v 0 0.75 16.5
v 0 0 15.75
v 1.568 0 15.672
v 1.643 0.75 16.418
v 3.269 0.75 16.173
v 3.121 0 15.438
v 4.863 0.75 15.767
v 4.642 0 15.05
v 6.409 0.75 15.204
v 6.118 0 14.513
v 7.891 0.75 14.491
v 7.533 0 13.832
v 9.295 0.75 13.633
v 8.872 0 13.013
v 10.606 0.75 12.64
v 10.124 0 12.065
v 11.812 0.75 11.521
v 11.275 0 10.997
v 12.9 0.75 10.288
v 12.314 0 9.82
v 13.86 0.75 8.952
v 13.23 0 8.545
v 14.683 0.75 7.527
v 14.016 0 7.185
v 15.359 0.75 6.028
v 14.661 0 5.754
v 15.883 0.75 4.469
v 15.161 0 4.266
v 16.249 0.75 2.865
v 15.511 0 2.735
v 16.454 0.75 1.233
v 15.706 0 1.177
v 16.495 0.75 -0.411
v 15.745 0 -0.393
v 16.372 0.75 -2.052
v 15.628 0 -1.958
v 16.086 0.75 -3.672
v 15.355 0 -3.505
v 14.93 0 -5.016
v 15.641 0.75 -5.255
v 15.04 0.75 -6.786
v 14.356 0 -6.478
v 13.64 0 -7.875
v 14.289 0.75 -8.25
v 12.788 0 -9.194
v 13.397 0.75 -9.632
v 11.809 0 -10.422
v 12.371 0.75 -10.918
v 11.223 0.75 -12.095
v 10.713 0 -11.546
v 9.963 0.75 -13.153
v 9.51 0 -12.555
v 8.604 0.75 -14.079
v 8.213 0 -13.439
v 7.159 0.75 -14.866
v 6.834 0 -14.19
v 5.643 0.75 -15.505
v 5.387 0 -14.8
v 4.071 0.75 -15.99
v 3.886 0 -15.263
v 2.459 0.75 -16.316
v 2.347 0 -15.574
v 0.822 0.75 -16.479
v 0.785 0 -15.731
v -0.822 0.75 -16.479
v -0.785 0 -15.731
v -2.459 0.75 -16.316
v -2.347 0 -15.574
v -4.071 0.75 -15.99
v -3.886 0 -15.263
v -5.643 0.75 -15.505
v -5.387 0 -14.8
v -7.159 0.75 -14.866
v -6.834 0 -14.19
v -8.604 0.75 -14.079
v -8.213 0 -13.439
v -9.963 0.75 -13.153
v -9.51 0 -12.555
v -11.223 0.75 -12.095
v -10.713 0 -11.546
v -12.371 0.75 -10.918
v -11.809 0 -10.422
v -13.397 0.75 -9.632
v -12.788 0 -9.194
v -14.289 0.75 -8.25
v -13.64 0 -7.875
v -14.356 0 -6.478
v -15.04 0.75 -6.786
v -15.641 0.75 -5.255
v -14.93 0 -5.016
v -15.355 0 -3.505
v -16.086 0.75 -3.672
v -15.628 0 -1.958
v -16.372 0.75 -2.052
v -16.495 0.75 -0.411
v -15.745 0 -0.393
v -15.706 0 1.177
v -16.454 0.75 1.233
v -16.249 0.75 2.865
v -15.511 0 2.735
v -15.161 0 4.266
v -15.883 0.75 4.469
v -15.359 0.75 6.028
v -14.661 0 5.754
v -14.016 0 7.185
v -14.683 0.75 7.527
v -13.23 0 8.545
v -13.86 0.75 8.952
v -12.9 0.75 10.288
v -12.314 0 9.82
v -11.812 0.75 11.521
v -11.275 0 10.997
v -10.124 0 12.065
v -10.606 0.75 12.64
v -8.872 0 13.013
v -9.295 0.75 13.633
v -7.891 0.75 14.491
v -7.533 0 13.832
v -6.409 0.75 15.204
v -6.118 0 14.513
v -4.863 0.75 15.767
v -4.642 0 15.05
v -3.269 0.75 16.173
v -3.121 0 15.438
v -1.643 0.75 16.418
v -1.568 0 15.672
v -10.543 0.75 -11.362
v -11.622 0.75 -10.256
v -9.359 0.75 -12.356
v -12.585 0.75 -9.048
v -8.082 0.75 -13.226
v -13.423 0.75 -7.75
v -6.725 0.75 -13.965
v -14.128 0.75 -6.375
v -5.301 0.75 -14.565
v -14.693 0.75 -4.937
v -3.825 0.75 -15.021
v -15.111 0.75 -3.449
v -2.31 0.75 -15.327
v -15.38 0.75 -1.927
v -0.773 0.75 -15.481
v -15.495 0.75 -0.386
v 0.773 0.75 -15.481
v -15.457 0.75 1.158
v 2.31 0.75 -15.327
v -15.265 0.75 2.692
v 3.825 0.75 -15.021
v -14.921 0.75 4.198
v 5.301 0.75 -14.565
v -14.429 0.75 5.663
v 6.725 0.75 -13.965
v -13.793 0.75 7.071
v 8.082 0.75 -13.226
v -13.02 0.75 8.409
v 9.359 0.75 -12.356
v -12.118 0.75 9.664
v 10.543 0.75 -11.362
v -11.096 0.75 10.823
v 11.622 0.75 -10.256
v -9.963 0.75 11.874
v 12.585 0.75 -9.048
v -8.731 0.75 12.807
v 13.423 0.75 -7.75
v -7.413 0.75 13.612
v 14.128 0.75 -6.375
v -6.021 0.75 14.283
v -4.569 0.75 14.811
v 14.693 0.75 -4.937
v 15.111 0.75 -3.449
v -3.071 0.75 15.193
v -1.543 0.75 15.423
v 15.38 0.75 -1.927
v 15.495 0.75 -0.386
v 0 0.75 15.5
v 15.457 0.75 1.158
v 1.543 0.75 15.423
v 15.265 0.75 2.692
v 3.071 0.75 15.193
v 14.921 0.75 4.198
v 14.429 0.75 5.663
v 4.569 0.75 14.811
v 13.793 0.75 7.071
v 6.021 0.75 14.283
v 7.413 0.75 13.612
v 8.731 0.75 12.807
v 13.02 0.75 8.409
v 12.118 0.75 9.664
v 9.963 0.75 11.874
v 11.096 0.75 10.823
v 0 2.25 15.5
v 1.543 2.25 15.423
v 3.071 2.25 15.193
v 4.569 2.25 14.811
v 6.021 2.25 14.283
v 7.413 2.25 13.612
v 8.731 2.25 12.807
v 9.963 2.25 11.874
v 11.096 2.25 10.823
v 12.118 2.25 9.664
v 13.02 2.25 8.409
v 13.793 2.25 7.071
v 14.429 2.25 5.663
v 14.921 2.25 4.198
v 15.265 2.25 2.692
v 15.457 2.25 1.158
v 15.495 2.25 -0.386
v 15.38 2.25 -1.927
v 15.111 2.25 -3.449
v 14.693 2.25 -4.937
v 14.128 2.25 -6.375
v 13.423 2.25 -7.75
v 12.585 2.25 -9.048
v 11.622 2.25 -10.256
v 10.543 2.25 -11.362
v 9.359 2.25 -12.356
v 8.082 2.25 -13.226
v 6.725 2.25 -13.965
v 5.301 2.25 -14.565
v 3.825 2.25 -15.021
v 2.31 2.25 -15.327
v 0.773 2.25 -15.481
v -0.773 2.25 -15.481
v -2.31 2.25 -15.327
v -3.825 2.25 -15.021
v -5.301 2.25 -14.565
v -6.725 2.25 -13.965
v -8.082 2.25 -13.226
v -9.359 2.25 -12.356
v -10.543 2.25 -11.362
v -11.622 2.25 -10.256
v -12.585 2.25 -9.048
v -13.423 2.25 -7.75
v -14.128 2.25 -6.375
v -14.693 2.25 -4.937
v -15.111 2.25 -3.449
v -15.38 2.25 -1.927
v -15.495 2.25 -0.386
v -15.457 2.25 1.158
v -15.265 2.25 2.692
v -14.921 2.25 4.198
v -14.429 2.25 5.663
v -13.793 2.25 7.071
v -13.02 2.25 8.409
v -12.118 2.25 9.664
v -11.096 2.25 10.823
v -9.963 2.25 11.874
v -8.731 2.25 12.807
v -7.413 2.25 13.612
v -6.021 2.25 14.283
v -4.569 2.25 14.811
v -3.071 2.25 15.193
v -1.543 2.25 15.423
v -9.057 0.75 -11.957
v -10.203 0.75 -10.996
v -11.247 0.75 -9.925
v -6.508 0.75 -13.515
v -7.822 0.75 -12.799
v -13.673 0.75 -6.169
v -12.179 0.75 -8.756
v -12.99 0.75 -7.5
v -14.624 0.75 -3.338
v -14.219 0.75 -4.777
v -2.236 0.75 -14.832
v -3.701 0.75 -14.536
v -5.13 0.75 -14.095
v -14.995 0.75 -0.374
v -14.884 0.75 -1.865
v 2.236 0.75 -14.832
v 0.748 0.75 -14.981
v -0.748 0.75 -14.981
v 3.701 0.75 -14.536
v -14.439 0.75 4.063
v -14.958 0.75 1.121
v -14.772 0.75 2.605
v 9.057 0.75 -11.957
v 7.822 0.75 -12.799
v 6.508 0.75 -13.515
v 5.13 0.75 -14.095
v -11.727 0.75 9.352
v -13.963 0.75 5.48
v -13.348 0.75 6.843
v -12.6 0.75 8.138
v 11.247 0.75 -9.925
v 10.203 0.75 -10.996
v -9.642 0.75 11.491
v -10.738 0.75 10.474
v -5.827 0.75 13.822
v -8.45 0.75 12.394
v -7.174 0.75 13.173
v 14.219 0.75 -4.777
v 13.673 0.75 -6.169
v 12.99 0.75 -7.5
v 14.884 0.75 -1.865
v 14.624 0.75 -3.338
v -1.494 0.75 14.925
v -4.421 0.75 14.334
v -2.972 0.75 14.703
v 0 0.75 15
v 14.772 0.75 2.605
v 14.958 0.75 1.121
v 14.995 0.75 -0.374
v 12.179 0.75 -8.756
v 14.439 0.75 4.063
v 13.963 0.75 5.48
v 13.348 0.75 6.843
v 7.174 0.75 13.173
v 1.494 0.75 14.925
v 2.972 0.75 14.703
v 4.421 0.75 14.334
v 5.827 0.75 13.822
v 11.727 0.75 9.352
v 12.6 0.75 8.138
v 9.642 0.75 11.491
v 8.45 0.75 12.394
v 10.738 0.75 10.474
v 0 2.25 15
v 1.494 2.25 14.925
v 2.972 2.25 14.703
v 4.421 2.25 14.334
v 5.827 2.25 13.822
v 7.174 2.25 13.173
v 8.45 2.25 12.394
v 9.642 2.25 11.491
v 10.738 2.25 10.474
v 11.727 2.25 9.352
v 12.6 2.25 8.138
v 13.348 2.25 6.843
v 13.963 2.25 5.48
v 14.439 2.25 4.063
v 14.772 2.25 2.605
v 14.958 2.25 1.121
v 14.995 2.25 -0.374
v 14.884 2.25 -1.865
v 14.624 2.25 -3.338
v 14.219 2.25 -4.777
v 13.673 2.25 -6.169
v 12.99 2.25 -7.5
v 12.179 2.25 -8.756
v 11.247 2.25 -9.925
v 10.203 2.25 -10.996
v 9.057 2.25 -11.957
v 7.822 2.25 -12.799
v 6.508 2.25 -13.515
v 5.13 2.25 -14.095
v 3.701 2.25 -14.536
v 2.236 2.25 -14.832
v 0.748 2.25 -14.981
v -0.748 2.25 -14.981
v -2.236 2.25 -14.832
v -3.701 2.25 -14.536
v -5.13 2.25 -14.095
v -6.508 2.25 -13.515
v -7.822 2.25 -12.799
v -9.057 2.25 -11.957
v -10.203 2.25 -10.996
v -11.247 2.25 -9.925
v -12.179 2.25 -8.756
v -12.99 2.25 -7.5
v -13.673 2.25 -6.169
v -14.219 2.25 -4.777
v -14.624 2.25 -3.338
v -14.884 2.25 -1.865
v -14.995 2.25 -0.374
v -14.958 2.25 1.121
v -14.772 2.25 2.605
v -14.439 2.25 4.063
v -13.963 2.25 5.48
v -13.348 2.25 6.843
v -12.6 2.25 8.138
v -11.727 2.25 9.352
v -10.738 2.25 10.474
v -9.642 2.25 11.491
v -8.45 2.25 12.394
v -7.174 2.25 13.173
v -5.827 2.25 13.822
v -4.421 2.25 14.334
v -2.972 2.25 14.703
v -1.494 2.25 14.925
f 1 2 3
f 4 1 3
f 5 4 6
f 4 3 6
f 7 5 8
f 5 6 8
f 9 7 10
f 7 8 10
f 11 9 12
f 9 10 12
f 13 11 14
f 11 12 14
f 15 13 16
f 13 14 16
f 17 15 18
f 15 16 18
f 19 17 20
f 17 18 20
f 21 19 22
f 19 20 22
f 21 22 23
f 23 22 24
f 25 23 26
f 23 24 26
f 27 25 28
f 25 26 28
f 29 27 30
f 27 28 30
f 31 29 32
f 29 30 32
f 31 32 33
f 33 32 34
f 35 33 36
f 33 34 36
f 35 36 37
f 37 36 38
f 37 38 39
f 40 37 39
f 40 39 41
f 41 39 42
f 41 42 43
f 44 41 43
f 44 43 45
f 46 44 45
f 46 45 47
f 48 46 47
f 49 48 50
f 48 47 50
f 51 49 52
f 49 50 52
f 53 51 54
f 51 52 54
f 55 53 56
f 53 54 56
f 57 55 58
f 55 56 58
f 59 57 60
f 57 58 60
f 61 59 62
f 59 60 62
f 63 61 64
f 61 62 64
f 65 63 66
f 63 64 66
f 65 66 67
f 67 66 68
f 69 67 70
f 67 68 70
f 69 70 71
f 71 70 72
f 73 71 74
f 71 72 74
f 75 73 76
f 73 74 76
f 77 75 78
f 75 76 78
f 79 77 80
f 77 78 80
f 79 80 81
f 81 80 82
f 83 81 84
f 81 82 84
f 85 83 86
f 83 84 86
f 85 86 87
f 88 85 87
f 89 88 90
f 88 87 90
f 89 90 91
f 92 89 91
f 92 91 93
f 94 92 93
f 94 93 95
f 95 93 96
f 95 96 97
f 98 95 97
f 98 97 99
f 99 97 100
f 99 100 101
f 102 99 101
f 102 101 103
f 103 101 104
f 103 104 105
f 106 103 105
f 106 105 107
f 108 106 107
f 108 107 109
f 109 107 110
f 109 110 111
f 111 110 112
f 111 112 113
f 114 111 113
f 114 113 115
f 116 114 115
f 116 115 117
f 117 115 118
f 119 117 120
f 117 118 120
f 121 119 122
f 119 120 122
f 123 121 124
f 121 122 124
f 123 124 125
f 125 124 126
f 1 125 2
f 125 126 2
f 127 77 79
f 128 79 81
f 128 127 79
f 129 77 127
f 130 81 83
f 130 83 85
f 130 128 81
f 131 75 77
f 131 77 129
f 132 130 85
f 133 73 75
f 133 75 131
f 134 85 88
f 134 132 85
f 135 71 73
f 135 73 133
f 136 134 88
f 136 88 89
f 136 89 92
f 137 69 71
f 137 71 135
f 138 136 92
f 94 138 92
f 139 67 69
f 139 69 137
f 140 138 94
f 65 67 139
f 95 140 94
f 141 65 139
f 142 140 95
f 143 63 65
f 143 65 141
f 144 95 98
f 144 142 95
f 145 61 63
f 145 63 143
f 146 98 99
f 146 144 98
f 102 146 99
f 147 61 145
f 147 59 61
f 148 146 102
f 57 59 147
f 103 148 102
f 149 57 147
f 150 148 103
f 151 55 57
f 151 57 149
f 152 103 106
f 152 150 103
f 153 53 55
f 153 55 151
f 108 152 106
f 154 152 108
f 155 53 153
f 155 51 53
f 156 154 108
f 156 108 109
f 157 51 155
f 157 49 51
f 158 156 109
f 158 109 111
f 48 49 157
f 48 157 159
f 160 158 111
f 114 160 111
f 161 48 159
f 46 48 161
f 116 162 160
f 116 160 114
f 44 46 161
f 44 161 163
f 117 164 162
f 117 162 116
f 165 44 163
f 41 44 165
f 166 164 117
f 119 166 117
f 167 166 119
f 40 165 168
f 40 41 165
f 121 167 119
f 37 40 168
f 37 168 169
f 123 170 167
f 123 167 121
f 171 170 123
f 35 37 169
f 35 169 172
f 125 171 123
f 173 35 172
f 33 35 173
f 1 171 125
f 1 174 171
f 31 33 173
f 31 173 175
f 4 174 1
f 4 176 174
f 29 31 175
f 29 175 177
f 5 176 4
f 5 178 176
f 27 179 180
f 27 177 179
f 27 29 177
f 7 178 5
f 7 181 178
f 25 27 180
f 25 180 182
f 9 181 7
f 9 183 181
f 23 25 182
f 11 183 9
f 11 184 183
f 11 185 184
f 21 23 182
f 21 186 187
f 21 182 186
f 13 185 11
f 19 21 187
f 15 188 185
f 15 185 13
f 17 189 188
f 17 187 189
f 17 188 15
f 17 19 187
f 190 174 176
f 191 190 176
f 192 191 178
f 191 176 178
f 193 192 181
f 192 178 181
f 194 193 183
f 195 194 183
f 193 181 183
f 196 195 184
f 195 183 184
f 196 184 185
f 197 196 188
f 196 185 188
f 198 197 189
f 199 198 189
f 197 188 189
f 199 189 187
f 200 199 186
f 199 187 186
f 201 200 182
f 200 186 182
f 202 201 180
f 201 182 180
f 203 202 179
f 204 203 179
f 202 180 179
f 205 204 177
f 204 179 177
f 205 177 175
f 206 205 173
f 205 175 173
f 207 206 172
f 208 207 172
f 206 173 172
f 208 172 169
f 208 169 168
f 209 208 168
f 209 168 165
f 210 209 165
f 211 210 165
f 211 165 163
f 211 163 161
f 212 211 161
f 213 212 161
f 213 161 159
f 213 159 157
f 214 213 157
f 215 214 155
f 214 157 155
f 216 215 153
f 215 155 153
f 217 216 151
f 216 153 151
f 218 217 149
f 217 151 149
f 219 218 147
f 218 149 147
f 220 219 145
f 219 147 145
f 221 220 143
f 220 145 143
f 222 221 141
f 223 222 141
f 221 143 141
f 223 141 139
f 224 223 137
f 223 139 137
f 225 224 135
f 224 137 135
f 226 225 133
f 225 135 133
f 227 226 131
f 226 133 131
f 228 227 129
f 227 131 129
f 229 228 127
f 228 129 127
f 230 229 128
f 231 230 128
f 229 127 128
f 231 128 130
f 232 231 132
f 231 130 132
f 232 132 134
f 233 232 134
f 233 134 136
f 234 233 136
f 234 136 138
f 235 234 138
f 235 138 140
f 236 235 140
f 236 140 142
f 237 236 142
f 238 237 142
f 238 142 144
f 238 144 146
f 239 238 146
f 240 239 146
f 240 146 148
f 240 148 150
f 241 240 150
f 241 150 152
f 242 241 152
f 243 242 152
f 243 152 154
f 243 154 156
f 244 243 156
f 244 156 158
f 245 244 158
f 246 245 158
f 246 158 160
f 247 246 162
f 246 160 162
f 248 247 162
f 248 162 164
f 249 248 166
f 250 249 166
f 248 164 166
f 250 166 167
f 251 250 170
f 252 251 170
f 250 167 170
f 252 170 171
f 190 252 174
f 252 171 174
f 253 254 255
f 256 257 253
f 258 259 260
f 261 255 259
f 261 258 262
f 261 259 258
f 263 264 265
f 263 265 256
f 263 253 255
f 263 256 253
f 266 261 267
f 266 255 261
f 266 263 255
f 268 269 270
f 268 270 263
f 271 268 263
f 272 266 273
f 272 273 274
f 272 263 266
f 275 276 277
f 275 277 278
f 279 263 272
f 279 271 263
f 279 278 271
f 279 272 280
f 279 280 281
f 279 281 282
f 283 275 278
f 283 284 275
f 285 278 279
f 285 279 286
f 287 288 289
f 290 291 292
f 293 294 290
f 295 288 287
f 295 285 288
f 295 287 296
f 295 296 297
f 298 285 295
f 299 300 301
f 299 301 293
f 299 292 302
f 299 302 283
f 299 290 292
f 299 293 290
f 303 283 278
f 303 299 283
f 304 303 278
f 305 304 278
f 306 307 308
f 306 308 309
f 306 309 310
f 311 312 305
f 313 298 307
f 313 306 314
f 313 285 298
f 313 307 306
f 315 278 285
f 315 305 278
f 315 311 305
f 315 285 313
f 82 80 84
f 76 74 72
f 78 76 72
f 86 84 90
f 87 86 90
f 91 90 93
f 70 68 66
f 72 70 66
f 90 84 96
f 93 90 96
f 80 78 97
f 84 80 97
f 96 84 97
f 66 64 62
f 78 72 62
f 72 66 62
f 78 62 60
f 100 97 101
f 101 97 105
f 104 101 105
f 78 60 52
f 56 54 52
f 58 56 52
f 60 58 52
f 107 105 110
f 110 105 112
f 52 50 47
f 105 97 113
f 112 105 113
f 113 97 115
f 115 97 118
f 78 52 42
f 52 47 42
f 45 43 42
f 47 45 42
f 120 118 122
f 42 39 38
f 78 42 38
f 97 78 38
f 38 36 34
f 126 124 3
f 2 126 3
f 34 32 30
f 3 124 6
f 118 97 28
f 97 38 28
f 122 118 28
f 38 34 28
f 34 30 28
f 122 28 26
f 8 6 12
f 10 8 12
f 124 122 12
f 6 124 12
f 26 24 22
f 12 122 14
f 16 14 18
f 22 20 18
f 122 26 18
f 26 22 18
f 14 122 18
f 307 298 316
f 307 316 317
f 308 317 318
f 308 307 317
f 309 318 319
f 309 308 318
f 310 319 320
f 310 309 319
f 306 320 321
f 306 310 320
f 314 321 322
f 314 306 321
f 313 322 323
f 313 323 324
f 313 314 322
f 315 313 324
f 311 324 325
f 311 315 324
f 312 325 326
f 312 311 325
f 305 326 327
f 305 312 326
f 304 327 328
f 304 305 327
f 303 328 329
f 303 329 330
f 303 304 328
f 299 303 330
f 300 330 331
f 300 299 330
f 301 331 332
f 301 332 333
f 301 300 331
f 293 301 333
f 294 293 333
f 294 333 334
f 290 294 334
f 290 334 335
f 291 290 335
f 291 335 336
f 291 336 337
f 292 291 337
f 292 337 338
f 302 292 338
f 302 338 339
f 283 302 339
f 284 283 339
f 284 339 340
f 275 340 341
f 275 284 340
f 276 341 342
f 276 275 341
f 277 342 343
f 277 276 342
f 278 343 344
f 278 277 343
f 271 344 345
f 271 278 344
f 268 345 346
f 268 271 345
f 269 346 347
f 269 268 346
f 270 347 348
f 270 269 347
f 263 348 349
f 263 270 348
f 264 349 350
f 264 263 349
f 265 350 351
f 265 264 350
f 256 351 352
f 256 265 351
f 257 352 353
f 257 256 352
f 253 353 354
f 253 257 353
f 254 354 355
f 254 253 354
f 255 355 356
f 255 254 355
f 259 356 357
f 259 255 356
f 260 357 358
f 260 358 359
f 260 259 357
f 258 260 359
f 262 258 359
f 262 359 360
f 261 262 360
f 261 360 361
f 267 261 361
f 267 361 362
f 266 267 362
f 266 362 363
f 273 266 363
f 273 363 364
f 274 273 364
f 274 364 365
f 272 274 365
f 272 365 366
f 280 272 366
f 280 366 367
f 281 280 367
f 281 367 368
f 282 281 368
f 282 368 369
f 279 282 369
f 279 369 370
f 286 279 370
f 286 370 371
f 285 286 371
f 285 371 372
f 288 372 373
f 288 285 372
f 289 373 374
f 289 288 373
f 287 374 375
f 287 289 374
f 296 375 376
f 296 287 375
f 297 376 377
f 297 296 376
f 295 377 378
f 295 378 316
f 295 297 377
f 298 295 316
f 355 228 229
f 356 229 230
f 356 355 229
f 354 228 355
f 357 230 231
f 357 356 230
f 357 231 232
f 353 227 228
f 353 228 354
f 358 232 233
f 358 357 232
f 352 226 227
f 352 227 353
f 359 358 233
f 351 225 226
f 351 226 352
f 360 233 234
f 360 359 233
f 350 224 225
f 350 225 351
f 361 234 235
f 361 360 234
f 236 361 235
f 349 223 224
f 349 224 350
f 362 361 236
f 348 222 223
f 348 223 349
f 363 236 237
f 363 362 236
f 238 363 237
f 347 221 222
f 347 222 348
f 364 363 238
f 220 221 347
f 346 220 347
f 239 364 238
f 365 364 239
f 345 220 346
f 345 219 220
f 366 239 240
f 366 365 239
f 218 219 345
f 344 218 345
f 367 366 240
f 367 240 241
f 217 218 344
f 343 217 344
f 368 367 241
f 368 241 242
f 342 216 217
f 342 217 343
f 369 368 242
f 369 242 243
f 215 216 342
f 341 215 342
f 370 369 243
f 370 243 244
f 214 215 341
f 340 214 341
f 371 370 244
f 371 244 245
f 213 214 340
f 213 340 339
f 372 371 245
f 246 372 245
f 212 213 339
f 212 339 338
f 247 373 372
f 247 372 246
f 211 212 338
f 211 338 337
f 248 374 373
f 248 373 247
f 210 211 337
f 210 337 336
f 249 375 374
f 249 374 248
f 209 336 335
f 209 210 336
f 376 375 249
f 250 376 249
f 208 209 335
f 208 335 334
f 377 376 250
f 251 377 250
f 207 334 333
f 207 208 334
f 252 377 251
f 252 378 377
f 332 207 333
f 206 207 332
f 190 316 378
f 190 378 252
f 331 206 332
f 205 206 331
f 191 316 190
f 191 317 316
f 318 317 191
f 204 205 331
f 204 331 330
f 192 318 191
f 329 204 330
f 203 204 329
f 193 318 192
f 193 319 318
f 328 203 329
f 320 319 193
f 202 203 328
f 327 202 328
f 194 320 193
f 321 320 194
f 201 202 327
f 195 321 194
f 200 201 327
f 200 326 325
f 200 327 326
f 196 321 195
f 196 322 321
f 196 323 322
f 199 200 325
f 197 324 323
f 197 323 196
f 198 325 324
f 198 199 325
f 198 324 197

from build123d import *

# Parameters (mm, degrees)
SKETCH2_R           = 16.5
BOSS_EXTRUDE1_DEPTH = 0.75
SKETCH3_R           = 15.5
SKETCH3_R_2         = 15
BOSS_EXTRUDE2_DEPTH = 1.5
CHAMFER1_SIZE       = 0.75


with BuildPart() as part:
    # Sketch2 → Boss-Extrude1 (new body)
    with BuildSketch(Plane(origin=(0, 0, 0), x_dir=(1, 0, 0), z_dir=(0, 1, 0))):
        with Locations(Location((0, 0, 0), (0, 0, 270))):
            Circle(SKETCH2_R)
    extrude(amount=BOSS_EXTRUDE1_DEPTH)

    # Sketch3 → Boss-Extrude2 (add)
    with BuildSketch(Plane(origin=(0, 0.75, 0), x_dir=(1, 0, 0), z_dir=(0, 1, 0))):
        with Locations(Location((0, 0, 0), (0, 0, 270))):
            Circle(SKETCH3_R)
        with Locations(Location((0, 0, 0), (0, 0, 270))):
            Circle(SKETCH3_R_2, mode=Mode.SUBTRACT)
    extrude(amount=BOSS_EXTRUDE2_DEPTH)

    # Chamfer1
    chamfer1_edges = [part.edges().sort_by_distance(p)[0] for p in [
        (0, 0, -16.5),
    ]]
    chamfer(chamfer1_edges, length=CHAMFER1_SIZE - 0.0001)  # a hair under: the kernel refuses the full size


solid = part.part
